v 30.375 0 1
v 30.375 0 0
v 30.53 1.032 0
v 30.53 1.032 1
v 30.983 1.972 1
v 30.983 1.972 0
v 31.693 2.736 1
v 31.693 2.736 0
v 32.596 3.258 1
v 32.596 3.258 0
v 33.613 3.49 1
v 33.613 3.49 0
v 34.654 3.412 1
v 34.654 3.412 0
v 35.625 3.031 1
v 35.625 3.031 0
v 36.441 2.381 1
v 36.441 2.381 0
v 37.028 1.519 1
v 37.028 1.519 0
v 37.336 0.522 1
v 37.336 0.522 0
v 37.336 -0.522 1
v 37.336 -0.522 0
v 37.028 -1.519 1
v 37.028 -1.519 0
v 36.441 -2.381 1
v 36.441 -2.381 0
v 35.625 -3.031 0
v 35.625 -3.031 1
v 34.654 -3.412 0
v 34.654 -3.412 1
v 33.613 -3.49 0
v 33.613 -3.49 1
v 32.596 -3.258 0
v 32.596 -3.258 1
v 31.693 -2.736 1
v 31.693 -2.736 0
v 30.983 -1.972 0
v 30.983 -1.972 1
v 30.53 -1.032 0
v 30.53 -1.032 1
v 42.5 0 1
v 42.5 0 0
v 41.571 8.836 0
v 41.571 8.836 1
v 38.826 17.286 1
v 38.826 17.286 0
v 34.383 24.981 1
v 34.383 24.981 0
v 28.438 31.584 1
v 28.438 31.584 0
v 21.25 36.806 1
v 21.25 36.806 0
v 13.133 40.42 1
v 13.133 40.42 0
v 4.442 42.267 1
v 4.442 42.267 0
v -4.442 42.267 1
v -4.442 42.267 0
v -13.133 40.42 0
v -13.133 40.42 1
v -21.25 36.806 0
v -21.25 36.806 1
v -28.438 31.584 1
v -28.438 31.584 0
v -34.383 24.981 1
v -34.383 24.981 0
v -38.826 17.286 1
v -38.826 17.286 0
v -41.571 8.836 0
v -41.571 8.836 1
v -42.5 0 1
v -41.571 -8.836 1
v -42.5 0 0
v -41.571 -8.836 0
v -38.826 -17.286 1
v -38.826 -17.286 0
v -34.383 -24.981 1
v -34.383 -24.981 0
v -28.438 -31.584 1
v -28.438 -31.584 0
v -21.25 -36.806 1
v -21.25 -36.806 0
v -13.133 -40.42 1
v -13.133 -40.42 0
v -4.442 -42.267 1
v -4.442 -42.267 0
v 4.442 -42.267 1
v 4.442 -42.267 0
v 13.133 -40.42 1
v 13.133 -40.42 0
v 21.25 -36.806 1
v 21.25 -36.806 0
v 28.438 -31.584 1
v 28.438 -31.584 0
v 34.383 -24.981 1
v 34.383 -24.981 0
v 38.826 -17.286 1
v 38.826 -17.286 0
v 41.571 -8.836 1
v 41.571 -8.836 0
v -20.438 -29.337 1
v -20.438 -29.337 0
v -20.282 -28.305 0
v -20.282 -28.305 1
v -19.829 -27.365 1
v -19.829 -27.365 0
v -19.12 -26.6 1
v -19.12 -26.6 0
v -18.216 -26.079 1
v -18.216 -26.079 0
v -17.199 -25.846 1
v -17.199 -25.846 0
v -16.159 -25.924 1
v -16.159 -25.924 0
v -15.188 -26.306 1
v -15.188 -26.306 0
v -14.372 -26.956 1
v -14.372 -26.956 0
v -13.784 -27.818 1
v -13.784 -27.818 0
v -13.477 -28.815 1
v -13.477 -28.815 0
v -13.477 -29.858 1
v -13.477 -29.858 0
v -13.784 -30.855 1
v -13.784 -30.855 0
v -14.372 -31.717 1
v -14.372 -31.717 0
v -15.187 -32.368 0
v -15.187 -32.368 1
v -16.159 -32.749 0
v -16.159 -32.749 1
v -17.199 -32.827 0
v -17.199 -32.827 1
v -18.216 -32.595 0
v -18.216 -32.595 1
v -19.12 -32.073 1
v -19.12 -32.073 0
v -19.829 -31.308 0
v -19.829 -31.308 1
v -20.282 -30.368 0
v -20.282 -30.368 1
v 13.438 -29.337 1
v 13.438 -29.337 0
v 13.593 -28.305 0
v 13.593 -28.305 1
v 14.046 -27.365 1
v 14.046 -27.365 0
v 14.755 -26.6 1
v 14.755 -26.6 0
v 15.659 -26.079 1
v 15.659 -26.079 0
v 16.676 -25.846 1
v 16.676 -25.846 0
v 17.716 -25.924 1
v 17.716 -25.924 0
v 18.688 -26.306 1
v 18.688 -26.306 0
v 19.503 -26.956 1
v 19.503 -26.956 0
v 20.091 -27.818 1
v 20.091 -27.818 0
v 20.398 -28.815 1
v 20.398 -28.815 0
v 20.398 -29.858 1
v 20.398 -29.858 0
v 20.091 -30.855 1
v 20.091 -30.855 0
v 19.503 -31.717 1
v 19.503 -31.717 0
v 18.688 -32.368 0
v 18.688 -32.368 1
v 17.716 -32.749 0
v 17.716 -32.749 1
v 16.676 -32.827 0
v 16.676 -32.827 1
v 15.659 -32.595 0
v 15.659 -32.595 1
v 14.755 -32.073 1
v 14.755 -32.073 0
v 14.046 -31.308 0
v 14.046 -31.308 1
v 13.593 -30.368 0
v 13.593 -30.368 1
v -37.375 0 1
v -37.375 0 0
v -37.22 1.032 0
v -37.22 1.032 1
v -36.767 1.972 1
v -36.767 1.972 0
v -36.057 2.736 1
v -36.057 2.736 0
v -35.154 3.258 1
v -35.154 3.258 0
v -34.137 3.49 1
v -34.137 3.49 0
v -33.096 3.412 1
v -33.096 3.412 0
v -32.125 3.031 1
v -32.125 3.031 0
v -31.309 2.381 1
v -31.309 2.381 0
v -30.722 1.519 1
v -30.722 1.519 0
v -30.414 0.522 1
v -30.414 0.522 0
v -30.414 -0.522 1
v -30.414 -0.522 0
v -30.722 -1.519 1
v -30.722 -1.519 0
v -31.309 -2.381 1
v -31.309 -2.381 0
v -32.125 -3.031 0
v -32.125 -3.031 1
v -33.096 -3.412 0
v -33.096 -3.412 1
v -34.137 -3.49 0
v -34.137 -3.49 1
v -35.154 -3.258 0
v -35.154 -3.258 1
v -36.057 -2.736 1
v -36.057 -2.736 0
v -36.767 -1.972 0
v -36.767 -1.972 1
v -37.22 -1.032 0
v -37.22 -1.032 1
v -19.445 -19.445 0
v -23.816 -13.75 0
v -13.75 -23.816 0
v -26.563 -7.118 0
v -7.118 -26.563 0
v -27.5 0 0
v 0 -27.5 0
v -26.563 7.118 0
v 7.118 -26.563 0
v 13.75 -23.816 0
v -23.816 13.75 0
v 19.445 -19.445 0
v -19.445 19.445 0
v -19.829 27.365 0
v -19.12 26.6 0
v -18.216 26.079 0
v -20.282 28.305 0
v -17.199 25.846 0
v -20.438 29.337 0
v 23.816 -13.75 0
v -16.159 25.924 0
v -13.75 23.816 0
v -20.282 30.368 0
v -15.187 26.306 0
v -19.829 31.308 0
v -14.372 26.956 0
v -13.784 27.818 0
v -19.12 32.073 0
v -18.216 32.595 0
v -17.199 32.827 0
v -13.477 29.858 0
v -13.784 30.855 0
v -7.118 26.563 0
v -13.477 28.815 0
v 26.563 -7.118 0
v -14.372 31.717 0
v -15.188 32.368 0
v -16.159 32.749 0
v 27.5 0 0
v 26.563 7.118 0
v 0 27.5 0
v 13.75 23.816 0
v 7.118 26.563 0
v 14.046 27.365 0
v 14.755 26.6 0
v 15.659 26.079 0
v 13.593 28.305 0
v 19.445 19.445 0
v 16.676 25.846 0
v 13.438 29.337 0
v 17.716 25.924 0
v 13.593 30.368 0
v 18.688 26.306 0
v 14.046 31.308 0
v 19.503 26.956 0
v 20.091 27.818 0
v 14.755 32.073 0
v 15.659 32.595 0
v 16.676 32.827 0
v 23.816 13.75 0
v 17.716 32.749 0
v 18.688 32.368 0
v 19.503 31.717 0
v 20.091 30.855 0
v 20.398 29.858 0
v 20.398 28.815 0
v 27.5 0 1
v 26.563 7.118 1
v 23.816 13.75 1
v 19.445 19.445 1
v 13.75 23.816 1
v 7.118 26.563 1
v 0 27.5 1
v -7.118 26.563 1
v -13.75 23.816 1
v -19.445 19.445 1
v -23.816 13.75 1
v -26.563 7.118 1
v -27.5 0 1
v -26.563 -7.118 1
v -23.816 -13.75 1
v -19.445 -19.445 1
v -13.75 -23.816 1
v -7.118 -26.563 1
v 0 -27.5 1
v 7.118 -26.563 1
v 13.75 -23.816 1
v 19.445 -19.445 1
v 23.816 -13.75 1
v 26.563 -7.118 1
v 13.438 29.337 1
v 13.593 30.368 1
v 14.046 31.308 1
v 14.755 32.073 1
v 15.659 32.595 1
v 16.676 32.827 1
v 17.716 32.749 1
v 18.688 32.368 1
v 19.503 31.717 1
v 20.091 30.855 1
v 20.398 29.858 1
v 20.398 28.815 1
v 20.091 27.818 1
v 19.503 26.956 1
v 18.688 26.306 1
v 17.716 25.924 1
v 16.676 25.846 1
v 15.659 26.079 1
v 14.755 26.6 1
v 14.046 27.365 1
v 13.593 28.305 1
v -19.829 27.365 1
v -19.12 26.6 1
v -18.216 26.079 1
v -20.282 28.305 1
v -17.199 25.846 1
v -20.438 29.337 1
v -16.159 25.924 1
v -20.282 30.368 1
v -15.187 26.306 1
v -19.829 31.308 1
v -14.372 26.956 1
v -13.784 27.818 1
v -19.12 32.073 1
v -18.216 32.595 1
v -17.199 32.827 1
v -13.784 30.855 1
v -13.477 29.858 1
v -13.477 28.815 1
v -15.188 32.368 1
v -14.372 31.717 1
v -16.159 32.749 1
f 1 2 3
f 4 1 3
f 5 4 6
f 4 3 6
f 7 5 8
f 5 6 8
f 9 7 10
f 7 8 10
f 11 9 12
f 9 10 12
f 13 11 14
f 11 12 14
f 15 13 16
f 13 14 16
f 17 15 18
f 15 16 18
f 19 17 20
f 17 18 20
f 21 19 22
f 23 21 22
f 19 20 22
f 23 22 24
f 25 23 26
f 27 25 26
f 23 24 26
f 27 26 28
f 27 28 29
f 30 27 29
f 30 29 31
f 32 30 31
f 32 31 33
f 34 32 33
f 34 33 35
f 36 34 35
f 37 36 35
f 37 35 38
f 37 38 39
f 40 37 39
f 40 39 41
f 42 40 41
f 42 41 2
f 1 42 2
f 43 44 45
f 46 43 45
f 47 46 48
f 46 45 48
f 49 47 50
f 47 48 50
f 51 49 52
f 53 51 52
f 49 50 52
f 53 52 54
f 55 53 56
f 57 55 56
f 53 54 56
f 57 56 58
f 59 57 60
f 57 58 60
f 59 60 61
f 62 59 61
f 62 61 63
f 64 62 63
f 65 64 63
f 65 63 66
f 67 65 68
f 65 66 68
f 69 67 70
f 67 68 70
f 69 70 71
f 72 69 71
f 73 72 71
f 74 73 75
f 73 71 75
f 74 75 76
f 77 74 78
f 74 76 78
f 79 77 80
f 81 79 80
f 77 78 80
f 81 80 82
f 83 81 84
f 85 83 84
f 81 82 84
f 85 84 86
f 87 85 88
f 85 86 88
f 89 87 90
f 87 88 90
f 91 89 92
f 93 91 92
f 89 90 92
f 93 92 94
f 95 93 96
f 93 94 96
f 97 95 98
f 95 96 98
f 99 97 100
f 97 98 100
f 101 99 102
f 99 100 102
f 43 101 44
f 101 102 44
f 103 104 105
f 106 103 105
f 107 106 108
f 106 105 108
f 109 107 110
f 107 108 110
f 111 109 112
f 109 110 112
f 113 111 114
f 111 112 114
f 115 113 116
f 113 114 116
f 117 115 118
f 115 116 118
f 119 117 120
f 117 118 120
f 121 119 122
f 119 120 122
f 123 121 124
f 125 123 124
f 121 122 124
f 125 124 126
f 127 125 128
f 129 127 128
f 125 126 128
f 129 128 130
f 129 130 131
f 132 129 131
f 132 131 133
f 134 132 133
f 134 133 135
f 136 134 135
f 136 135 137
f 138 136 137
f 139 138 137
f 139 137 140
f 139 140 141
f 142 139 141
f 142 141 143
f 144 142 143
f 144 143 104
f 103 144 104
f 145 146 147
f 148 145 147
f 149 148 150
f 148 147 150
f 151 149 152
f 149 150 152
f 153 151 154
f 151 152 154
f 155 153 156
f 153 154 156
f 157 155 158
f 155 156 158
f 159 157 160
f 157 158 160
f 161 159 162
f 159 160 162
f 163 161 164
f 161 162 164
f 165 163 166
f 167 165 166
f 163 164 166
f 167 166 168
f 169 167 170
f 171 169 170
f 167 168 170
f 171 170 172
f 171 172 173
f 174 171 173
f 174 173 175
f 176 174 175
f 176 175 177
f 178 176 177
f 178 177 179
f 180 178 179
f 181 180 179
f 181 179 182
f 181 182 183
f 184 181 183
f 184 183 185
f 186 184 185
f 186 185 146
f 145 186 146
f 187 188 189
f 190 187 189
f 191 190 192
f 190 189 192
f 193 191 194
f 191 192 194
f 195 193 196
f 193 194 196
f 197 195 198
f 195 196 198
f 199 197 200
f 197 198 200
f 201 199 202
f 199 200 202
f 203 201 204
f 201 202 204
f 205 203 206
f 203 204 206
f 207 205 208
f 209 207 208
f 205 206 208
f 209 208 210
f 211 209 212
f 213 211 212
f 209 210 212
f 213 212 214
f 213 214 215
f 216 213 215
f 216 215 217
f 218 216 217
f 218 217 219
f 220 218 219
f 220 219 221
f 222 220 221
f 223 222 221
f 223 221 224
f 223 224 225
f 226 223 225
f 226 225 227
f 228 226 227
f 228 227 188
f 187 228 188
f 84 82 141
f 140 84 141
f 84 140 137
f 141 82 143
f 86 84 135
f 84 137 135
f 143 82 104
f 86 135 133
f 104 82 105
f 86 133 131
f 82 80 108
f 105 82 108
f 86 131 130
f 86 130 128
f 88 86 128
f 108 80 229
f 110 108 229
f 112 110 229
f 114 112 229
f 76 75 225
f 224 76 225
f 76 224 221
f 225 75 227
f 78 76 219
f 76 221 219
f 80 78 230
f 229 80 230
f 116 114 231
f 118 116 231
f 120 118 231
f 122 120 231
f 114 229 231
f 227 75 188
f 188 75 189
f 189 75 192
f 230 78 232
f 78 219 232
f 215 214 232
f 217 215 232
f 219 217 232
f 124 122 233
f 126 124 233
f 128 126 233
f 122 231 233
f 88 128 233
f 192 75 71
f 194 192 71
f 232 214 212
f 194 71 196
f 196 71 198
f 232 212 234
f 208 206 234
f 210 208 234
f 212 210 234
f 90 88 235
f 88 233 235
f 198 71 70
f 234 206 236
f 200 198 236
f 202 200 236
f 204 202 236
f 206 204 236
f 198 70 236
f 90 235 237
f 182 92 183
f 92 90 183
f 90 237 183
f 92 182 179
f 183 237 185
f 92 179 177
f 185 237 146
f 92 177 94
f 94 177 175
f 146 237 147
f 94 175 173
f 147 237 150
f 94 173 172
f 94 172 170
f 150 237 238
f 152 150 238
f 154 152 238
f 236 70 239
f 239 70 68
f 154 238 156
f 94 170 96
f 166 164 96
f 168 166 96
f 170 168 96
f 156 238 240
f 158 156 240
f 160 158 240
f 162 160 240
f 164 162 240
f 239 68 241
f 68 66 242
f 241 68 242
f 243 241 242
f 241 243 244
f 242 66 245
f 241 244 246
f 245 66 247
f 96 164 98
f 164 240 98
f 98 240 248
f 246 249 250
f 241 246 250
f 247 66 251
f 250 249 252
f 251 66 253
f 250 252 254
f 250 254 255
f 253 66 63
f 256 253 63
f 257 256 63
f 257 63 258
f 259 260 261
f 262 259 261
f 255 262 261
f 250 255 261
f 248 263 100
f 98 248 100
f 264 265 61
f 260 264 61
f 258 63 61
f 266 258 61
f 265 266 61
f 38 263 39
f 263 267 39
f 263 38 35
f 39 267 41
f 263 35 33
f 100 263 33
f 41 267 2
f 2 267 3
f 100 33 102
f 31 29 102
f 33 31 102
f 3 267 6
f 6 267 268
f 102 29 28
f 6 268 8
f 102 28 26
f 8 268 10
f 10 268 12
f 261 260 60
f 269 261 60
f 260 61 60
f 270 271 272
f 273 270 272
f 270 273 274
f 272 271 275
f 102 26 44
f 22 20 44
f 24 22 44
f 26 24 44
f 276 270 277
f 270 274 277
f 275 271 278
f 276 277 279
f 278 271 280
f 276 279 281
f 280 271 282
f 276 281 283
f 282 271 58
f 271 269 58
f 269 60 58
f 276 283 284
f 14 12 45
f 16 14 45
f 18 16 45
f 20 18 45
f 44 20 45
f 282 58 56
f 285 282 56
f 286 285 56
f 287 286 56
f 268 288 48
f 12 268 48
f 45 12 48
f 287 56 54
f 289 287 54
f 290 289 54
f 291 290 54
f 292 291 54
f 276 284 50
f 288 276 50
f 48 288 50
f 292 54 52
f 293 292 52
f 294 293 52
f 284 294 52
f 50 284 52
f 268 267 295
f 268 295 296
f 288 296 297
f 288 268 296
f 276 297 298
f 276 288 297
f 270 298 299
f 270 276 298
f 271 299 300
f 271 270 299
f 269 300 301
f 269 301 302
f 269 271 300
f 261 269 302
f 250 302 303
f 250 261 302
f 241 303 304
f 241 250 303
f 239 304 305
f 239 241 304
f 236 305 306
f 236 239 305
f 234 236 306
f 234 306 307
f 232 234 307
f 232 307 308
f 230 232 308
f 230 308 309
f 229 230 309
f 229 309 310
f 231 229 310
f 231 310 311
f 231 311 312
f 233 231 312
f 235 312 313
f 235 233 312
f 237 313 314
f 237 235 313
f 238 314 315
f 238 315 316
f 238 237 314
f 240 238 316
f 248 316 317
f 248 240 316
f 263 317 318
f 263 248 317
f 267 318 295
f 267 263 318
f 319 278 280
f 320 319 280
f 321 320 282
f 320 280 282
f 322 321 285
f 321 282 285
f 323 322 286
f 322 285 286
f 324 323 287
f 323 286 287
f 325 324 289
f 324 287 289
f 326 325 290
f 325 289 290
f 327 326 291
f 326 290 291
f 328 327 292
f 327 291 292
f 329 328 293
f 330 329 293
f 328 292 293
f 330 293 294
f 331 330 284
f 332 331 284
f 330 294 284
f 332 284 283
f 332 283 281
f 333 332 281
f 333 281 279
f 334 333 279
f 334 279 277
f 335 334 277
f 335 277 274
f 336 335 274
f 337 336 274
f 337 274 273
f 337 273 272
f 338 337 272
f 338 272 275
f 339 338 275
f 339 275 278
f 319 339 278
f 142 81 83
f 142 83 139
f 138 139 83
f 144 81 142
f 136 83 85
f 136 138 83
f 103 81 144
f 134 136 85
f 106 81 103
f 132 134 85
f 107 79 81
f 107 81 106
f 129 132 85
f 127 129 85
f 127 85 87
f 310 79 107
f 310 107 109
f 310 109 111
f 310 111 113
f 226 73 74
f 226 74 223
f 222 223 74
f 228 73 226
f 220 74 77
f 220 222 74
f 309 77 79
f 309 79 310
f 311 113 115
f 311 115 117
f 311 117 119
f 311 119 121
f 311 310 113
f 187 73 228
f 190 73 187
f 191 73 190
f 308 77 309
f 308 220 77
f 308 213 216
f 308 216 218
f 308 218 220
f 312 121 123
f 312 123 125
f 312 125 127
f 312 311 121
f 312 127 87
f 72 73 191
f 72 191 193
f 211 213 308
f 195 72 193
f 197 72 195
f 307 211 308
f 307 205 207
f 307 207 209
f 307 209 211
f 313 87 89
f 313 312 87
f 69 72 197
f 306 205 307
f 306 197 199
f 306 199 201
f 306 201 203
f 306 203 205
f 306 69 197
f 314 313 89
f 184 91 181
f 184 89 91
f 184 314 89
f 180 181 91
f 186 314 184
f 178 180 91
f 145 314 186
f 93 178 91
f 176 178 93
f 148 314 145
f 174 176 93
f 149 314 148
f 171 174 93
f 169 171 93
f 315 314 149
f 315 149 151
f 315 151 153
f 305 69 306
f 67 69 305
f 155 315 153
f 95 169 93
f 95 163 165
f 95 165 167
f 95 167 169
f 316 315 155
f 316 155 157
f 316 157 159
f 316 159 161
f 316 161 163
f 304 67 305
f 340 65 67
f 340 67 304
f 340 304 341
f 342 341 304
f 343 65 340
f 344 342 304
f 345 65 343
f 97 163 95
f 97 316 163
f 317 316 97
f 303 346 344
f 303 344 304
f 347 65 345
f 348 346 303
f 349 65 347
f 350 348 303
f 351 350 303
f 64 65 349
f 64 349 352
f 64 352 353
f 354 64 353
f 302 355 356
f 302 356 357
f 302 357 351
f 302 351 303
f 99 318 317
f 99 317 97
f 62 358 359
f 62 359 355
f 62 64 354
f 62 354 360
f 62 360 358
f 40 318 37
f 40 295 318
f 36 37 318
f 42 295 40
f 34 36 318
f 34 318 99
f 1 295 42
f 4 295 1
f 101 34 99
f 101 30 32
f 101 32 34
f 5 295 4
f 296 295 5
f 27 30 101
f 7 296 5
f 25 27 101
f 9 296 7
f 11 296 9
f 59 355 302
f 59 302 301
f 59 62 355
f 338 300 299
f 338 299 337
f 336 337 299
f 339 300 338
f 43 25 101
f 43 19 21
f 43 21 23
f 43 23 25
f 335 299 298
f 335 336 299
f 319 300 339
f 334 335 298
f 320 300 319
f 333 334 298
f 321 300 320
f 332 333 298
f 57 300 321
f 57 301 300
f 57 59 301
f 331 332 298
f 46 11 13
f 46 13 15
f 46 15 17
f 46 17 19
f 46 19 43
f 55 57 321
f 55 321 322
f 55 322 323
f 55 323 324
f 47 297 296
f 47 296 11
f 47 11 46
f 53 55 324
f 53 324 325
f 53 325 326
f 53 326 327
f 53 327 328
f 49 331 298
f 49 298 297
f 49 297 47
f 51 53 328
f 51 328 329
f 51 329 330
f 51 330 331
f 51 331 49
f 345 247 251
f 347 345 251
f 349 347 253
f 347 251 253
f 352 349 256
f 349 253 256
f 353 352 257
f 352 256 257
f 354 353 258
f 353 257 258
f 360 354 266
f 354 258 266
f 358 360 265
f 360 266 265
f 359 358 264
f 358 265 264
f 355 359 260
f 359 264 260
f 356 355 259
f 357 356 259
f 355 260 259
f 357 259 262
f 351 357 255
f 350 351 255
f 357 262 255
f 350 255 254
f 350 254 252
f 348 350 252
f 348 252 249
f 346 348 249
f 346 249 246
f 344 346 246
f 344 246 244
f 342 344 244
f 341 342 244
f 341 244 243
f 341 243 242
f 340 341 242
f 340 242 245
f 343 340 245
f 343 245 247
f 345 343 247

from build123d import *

# Parameters (mm, degrees)
SKETCH1_R            = 42.5
SKETCH1_R_2          = 27.5
BOSS_EXTRUDE1_DEPTH  = 1
M6_CLEARANCE_HOLE1_D = 7


with BuildPart() as part:
    # Sketch1 → Boss-Extrude1 (new body)
    with BuildSketch(Plane.XY):
        Circle(SKETCH1_R)
        Circle(SKETCH1_R_2, mode=Mode.SUBTRACT)
    extrude(amount=BOSS_EXTRUDE1_DEPTH)

    # M6 Clearance Hole1 (through all)
    with Locations(Plane.XY.offset(1)):
        with Locations((-33.875, 0), (-16.9375, -29.336610553), (16.9375, -29.336610553), (33.875, 0), (16.9375, 29.336610553), (-16.9375, 29.336610553)):
            Hole(M6_CLEARANCE_HOLE1_D / 2)


solid = part.part
